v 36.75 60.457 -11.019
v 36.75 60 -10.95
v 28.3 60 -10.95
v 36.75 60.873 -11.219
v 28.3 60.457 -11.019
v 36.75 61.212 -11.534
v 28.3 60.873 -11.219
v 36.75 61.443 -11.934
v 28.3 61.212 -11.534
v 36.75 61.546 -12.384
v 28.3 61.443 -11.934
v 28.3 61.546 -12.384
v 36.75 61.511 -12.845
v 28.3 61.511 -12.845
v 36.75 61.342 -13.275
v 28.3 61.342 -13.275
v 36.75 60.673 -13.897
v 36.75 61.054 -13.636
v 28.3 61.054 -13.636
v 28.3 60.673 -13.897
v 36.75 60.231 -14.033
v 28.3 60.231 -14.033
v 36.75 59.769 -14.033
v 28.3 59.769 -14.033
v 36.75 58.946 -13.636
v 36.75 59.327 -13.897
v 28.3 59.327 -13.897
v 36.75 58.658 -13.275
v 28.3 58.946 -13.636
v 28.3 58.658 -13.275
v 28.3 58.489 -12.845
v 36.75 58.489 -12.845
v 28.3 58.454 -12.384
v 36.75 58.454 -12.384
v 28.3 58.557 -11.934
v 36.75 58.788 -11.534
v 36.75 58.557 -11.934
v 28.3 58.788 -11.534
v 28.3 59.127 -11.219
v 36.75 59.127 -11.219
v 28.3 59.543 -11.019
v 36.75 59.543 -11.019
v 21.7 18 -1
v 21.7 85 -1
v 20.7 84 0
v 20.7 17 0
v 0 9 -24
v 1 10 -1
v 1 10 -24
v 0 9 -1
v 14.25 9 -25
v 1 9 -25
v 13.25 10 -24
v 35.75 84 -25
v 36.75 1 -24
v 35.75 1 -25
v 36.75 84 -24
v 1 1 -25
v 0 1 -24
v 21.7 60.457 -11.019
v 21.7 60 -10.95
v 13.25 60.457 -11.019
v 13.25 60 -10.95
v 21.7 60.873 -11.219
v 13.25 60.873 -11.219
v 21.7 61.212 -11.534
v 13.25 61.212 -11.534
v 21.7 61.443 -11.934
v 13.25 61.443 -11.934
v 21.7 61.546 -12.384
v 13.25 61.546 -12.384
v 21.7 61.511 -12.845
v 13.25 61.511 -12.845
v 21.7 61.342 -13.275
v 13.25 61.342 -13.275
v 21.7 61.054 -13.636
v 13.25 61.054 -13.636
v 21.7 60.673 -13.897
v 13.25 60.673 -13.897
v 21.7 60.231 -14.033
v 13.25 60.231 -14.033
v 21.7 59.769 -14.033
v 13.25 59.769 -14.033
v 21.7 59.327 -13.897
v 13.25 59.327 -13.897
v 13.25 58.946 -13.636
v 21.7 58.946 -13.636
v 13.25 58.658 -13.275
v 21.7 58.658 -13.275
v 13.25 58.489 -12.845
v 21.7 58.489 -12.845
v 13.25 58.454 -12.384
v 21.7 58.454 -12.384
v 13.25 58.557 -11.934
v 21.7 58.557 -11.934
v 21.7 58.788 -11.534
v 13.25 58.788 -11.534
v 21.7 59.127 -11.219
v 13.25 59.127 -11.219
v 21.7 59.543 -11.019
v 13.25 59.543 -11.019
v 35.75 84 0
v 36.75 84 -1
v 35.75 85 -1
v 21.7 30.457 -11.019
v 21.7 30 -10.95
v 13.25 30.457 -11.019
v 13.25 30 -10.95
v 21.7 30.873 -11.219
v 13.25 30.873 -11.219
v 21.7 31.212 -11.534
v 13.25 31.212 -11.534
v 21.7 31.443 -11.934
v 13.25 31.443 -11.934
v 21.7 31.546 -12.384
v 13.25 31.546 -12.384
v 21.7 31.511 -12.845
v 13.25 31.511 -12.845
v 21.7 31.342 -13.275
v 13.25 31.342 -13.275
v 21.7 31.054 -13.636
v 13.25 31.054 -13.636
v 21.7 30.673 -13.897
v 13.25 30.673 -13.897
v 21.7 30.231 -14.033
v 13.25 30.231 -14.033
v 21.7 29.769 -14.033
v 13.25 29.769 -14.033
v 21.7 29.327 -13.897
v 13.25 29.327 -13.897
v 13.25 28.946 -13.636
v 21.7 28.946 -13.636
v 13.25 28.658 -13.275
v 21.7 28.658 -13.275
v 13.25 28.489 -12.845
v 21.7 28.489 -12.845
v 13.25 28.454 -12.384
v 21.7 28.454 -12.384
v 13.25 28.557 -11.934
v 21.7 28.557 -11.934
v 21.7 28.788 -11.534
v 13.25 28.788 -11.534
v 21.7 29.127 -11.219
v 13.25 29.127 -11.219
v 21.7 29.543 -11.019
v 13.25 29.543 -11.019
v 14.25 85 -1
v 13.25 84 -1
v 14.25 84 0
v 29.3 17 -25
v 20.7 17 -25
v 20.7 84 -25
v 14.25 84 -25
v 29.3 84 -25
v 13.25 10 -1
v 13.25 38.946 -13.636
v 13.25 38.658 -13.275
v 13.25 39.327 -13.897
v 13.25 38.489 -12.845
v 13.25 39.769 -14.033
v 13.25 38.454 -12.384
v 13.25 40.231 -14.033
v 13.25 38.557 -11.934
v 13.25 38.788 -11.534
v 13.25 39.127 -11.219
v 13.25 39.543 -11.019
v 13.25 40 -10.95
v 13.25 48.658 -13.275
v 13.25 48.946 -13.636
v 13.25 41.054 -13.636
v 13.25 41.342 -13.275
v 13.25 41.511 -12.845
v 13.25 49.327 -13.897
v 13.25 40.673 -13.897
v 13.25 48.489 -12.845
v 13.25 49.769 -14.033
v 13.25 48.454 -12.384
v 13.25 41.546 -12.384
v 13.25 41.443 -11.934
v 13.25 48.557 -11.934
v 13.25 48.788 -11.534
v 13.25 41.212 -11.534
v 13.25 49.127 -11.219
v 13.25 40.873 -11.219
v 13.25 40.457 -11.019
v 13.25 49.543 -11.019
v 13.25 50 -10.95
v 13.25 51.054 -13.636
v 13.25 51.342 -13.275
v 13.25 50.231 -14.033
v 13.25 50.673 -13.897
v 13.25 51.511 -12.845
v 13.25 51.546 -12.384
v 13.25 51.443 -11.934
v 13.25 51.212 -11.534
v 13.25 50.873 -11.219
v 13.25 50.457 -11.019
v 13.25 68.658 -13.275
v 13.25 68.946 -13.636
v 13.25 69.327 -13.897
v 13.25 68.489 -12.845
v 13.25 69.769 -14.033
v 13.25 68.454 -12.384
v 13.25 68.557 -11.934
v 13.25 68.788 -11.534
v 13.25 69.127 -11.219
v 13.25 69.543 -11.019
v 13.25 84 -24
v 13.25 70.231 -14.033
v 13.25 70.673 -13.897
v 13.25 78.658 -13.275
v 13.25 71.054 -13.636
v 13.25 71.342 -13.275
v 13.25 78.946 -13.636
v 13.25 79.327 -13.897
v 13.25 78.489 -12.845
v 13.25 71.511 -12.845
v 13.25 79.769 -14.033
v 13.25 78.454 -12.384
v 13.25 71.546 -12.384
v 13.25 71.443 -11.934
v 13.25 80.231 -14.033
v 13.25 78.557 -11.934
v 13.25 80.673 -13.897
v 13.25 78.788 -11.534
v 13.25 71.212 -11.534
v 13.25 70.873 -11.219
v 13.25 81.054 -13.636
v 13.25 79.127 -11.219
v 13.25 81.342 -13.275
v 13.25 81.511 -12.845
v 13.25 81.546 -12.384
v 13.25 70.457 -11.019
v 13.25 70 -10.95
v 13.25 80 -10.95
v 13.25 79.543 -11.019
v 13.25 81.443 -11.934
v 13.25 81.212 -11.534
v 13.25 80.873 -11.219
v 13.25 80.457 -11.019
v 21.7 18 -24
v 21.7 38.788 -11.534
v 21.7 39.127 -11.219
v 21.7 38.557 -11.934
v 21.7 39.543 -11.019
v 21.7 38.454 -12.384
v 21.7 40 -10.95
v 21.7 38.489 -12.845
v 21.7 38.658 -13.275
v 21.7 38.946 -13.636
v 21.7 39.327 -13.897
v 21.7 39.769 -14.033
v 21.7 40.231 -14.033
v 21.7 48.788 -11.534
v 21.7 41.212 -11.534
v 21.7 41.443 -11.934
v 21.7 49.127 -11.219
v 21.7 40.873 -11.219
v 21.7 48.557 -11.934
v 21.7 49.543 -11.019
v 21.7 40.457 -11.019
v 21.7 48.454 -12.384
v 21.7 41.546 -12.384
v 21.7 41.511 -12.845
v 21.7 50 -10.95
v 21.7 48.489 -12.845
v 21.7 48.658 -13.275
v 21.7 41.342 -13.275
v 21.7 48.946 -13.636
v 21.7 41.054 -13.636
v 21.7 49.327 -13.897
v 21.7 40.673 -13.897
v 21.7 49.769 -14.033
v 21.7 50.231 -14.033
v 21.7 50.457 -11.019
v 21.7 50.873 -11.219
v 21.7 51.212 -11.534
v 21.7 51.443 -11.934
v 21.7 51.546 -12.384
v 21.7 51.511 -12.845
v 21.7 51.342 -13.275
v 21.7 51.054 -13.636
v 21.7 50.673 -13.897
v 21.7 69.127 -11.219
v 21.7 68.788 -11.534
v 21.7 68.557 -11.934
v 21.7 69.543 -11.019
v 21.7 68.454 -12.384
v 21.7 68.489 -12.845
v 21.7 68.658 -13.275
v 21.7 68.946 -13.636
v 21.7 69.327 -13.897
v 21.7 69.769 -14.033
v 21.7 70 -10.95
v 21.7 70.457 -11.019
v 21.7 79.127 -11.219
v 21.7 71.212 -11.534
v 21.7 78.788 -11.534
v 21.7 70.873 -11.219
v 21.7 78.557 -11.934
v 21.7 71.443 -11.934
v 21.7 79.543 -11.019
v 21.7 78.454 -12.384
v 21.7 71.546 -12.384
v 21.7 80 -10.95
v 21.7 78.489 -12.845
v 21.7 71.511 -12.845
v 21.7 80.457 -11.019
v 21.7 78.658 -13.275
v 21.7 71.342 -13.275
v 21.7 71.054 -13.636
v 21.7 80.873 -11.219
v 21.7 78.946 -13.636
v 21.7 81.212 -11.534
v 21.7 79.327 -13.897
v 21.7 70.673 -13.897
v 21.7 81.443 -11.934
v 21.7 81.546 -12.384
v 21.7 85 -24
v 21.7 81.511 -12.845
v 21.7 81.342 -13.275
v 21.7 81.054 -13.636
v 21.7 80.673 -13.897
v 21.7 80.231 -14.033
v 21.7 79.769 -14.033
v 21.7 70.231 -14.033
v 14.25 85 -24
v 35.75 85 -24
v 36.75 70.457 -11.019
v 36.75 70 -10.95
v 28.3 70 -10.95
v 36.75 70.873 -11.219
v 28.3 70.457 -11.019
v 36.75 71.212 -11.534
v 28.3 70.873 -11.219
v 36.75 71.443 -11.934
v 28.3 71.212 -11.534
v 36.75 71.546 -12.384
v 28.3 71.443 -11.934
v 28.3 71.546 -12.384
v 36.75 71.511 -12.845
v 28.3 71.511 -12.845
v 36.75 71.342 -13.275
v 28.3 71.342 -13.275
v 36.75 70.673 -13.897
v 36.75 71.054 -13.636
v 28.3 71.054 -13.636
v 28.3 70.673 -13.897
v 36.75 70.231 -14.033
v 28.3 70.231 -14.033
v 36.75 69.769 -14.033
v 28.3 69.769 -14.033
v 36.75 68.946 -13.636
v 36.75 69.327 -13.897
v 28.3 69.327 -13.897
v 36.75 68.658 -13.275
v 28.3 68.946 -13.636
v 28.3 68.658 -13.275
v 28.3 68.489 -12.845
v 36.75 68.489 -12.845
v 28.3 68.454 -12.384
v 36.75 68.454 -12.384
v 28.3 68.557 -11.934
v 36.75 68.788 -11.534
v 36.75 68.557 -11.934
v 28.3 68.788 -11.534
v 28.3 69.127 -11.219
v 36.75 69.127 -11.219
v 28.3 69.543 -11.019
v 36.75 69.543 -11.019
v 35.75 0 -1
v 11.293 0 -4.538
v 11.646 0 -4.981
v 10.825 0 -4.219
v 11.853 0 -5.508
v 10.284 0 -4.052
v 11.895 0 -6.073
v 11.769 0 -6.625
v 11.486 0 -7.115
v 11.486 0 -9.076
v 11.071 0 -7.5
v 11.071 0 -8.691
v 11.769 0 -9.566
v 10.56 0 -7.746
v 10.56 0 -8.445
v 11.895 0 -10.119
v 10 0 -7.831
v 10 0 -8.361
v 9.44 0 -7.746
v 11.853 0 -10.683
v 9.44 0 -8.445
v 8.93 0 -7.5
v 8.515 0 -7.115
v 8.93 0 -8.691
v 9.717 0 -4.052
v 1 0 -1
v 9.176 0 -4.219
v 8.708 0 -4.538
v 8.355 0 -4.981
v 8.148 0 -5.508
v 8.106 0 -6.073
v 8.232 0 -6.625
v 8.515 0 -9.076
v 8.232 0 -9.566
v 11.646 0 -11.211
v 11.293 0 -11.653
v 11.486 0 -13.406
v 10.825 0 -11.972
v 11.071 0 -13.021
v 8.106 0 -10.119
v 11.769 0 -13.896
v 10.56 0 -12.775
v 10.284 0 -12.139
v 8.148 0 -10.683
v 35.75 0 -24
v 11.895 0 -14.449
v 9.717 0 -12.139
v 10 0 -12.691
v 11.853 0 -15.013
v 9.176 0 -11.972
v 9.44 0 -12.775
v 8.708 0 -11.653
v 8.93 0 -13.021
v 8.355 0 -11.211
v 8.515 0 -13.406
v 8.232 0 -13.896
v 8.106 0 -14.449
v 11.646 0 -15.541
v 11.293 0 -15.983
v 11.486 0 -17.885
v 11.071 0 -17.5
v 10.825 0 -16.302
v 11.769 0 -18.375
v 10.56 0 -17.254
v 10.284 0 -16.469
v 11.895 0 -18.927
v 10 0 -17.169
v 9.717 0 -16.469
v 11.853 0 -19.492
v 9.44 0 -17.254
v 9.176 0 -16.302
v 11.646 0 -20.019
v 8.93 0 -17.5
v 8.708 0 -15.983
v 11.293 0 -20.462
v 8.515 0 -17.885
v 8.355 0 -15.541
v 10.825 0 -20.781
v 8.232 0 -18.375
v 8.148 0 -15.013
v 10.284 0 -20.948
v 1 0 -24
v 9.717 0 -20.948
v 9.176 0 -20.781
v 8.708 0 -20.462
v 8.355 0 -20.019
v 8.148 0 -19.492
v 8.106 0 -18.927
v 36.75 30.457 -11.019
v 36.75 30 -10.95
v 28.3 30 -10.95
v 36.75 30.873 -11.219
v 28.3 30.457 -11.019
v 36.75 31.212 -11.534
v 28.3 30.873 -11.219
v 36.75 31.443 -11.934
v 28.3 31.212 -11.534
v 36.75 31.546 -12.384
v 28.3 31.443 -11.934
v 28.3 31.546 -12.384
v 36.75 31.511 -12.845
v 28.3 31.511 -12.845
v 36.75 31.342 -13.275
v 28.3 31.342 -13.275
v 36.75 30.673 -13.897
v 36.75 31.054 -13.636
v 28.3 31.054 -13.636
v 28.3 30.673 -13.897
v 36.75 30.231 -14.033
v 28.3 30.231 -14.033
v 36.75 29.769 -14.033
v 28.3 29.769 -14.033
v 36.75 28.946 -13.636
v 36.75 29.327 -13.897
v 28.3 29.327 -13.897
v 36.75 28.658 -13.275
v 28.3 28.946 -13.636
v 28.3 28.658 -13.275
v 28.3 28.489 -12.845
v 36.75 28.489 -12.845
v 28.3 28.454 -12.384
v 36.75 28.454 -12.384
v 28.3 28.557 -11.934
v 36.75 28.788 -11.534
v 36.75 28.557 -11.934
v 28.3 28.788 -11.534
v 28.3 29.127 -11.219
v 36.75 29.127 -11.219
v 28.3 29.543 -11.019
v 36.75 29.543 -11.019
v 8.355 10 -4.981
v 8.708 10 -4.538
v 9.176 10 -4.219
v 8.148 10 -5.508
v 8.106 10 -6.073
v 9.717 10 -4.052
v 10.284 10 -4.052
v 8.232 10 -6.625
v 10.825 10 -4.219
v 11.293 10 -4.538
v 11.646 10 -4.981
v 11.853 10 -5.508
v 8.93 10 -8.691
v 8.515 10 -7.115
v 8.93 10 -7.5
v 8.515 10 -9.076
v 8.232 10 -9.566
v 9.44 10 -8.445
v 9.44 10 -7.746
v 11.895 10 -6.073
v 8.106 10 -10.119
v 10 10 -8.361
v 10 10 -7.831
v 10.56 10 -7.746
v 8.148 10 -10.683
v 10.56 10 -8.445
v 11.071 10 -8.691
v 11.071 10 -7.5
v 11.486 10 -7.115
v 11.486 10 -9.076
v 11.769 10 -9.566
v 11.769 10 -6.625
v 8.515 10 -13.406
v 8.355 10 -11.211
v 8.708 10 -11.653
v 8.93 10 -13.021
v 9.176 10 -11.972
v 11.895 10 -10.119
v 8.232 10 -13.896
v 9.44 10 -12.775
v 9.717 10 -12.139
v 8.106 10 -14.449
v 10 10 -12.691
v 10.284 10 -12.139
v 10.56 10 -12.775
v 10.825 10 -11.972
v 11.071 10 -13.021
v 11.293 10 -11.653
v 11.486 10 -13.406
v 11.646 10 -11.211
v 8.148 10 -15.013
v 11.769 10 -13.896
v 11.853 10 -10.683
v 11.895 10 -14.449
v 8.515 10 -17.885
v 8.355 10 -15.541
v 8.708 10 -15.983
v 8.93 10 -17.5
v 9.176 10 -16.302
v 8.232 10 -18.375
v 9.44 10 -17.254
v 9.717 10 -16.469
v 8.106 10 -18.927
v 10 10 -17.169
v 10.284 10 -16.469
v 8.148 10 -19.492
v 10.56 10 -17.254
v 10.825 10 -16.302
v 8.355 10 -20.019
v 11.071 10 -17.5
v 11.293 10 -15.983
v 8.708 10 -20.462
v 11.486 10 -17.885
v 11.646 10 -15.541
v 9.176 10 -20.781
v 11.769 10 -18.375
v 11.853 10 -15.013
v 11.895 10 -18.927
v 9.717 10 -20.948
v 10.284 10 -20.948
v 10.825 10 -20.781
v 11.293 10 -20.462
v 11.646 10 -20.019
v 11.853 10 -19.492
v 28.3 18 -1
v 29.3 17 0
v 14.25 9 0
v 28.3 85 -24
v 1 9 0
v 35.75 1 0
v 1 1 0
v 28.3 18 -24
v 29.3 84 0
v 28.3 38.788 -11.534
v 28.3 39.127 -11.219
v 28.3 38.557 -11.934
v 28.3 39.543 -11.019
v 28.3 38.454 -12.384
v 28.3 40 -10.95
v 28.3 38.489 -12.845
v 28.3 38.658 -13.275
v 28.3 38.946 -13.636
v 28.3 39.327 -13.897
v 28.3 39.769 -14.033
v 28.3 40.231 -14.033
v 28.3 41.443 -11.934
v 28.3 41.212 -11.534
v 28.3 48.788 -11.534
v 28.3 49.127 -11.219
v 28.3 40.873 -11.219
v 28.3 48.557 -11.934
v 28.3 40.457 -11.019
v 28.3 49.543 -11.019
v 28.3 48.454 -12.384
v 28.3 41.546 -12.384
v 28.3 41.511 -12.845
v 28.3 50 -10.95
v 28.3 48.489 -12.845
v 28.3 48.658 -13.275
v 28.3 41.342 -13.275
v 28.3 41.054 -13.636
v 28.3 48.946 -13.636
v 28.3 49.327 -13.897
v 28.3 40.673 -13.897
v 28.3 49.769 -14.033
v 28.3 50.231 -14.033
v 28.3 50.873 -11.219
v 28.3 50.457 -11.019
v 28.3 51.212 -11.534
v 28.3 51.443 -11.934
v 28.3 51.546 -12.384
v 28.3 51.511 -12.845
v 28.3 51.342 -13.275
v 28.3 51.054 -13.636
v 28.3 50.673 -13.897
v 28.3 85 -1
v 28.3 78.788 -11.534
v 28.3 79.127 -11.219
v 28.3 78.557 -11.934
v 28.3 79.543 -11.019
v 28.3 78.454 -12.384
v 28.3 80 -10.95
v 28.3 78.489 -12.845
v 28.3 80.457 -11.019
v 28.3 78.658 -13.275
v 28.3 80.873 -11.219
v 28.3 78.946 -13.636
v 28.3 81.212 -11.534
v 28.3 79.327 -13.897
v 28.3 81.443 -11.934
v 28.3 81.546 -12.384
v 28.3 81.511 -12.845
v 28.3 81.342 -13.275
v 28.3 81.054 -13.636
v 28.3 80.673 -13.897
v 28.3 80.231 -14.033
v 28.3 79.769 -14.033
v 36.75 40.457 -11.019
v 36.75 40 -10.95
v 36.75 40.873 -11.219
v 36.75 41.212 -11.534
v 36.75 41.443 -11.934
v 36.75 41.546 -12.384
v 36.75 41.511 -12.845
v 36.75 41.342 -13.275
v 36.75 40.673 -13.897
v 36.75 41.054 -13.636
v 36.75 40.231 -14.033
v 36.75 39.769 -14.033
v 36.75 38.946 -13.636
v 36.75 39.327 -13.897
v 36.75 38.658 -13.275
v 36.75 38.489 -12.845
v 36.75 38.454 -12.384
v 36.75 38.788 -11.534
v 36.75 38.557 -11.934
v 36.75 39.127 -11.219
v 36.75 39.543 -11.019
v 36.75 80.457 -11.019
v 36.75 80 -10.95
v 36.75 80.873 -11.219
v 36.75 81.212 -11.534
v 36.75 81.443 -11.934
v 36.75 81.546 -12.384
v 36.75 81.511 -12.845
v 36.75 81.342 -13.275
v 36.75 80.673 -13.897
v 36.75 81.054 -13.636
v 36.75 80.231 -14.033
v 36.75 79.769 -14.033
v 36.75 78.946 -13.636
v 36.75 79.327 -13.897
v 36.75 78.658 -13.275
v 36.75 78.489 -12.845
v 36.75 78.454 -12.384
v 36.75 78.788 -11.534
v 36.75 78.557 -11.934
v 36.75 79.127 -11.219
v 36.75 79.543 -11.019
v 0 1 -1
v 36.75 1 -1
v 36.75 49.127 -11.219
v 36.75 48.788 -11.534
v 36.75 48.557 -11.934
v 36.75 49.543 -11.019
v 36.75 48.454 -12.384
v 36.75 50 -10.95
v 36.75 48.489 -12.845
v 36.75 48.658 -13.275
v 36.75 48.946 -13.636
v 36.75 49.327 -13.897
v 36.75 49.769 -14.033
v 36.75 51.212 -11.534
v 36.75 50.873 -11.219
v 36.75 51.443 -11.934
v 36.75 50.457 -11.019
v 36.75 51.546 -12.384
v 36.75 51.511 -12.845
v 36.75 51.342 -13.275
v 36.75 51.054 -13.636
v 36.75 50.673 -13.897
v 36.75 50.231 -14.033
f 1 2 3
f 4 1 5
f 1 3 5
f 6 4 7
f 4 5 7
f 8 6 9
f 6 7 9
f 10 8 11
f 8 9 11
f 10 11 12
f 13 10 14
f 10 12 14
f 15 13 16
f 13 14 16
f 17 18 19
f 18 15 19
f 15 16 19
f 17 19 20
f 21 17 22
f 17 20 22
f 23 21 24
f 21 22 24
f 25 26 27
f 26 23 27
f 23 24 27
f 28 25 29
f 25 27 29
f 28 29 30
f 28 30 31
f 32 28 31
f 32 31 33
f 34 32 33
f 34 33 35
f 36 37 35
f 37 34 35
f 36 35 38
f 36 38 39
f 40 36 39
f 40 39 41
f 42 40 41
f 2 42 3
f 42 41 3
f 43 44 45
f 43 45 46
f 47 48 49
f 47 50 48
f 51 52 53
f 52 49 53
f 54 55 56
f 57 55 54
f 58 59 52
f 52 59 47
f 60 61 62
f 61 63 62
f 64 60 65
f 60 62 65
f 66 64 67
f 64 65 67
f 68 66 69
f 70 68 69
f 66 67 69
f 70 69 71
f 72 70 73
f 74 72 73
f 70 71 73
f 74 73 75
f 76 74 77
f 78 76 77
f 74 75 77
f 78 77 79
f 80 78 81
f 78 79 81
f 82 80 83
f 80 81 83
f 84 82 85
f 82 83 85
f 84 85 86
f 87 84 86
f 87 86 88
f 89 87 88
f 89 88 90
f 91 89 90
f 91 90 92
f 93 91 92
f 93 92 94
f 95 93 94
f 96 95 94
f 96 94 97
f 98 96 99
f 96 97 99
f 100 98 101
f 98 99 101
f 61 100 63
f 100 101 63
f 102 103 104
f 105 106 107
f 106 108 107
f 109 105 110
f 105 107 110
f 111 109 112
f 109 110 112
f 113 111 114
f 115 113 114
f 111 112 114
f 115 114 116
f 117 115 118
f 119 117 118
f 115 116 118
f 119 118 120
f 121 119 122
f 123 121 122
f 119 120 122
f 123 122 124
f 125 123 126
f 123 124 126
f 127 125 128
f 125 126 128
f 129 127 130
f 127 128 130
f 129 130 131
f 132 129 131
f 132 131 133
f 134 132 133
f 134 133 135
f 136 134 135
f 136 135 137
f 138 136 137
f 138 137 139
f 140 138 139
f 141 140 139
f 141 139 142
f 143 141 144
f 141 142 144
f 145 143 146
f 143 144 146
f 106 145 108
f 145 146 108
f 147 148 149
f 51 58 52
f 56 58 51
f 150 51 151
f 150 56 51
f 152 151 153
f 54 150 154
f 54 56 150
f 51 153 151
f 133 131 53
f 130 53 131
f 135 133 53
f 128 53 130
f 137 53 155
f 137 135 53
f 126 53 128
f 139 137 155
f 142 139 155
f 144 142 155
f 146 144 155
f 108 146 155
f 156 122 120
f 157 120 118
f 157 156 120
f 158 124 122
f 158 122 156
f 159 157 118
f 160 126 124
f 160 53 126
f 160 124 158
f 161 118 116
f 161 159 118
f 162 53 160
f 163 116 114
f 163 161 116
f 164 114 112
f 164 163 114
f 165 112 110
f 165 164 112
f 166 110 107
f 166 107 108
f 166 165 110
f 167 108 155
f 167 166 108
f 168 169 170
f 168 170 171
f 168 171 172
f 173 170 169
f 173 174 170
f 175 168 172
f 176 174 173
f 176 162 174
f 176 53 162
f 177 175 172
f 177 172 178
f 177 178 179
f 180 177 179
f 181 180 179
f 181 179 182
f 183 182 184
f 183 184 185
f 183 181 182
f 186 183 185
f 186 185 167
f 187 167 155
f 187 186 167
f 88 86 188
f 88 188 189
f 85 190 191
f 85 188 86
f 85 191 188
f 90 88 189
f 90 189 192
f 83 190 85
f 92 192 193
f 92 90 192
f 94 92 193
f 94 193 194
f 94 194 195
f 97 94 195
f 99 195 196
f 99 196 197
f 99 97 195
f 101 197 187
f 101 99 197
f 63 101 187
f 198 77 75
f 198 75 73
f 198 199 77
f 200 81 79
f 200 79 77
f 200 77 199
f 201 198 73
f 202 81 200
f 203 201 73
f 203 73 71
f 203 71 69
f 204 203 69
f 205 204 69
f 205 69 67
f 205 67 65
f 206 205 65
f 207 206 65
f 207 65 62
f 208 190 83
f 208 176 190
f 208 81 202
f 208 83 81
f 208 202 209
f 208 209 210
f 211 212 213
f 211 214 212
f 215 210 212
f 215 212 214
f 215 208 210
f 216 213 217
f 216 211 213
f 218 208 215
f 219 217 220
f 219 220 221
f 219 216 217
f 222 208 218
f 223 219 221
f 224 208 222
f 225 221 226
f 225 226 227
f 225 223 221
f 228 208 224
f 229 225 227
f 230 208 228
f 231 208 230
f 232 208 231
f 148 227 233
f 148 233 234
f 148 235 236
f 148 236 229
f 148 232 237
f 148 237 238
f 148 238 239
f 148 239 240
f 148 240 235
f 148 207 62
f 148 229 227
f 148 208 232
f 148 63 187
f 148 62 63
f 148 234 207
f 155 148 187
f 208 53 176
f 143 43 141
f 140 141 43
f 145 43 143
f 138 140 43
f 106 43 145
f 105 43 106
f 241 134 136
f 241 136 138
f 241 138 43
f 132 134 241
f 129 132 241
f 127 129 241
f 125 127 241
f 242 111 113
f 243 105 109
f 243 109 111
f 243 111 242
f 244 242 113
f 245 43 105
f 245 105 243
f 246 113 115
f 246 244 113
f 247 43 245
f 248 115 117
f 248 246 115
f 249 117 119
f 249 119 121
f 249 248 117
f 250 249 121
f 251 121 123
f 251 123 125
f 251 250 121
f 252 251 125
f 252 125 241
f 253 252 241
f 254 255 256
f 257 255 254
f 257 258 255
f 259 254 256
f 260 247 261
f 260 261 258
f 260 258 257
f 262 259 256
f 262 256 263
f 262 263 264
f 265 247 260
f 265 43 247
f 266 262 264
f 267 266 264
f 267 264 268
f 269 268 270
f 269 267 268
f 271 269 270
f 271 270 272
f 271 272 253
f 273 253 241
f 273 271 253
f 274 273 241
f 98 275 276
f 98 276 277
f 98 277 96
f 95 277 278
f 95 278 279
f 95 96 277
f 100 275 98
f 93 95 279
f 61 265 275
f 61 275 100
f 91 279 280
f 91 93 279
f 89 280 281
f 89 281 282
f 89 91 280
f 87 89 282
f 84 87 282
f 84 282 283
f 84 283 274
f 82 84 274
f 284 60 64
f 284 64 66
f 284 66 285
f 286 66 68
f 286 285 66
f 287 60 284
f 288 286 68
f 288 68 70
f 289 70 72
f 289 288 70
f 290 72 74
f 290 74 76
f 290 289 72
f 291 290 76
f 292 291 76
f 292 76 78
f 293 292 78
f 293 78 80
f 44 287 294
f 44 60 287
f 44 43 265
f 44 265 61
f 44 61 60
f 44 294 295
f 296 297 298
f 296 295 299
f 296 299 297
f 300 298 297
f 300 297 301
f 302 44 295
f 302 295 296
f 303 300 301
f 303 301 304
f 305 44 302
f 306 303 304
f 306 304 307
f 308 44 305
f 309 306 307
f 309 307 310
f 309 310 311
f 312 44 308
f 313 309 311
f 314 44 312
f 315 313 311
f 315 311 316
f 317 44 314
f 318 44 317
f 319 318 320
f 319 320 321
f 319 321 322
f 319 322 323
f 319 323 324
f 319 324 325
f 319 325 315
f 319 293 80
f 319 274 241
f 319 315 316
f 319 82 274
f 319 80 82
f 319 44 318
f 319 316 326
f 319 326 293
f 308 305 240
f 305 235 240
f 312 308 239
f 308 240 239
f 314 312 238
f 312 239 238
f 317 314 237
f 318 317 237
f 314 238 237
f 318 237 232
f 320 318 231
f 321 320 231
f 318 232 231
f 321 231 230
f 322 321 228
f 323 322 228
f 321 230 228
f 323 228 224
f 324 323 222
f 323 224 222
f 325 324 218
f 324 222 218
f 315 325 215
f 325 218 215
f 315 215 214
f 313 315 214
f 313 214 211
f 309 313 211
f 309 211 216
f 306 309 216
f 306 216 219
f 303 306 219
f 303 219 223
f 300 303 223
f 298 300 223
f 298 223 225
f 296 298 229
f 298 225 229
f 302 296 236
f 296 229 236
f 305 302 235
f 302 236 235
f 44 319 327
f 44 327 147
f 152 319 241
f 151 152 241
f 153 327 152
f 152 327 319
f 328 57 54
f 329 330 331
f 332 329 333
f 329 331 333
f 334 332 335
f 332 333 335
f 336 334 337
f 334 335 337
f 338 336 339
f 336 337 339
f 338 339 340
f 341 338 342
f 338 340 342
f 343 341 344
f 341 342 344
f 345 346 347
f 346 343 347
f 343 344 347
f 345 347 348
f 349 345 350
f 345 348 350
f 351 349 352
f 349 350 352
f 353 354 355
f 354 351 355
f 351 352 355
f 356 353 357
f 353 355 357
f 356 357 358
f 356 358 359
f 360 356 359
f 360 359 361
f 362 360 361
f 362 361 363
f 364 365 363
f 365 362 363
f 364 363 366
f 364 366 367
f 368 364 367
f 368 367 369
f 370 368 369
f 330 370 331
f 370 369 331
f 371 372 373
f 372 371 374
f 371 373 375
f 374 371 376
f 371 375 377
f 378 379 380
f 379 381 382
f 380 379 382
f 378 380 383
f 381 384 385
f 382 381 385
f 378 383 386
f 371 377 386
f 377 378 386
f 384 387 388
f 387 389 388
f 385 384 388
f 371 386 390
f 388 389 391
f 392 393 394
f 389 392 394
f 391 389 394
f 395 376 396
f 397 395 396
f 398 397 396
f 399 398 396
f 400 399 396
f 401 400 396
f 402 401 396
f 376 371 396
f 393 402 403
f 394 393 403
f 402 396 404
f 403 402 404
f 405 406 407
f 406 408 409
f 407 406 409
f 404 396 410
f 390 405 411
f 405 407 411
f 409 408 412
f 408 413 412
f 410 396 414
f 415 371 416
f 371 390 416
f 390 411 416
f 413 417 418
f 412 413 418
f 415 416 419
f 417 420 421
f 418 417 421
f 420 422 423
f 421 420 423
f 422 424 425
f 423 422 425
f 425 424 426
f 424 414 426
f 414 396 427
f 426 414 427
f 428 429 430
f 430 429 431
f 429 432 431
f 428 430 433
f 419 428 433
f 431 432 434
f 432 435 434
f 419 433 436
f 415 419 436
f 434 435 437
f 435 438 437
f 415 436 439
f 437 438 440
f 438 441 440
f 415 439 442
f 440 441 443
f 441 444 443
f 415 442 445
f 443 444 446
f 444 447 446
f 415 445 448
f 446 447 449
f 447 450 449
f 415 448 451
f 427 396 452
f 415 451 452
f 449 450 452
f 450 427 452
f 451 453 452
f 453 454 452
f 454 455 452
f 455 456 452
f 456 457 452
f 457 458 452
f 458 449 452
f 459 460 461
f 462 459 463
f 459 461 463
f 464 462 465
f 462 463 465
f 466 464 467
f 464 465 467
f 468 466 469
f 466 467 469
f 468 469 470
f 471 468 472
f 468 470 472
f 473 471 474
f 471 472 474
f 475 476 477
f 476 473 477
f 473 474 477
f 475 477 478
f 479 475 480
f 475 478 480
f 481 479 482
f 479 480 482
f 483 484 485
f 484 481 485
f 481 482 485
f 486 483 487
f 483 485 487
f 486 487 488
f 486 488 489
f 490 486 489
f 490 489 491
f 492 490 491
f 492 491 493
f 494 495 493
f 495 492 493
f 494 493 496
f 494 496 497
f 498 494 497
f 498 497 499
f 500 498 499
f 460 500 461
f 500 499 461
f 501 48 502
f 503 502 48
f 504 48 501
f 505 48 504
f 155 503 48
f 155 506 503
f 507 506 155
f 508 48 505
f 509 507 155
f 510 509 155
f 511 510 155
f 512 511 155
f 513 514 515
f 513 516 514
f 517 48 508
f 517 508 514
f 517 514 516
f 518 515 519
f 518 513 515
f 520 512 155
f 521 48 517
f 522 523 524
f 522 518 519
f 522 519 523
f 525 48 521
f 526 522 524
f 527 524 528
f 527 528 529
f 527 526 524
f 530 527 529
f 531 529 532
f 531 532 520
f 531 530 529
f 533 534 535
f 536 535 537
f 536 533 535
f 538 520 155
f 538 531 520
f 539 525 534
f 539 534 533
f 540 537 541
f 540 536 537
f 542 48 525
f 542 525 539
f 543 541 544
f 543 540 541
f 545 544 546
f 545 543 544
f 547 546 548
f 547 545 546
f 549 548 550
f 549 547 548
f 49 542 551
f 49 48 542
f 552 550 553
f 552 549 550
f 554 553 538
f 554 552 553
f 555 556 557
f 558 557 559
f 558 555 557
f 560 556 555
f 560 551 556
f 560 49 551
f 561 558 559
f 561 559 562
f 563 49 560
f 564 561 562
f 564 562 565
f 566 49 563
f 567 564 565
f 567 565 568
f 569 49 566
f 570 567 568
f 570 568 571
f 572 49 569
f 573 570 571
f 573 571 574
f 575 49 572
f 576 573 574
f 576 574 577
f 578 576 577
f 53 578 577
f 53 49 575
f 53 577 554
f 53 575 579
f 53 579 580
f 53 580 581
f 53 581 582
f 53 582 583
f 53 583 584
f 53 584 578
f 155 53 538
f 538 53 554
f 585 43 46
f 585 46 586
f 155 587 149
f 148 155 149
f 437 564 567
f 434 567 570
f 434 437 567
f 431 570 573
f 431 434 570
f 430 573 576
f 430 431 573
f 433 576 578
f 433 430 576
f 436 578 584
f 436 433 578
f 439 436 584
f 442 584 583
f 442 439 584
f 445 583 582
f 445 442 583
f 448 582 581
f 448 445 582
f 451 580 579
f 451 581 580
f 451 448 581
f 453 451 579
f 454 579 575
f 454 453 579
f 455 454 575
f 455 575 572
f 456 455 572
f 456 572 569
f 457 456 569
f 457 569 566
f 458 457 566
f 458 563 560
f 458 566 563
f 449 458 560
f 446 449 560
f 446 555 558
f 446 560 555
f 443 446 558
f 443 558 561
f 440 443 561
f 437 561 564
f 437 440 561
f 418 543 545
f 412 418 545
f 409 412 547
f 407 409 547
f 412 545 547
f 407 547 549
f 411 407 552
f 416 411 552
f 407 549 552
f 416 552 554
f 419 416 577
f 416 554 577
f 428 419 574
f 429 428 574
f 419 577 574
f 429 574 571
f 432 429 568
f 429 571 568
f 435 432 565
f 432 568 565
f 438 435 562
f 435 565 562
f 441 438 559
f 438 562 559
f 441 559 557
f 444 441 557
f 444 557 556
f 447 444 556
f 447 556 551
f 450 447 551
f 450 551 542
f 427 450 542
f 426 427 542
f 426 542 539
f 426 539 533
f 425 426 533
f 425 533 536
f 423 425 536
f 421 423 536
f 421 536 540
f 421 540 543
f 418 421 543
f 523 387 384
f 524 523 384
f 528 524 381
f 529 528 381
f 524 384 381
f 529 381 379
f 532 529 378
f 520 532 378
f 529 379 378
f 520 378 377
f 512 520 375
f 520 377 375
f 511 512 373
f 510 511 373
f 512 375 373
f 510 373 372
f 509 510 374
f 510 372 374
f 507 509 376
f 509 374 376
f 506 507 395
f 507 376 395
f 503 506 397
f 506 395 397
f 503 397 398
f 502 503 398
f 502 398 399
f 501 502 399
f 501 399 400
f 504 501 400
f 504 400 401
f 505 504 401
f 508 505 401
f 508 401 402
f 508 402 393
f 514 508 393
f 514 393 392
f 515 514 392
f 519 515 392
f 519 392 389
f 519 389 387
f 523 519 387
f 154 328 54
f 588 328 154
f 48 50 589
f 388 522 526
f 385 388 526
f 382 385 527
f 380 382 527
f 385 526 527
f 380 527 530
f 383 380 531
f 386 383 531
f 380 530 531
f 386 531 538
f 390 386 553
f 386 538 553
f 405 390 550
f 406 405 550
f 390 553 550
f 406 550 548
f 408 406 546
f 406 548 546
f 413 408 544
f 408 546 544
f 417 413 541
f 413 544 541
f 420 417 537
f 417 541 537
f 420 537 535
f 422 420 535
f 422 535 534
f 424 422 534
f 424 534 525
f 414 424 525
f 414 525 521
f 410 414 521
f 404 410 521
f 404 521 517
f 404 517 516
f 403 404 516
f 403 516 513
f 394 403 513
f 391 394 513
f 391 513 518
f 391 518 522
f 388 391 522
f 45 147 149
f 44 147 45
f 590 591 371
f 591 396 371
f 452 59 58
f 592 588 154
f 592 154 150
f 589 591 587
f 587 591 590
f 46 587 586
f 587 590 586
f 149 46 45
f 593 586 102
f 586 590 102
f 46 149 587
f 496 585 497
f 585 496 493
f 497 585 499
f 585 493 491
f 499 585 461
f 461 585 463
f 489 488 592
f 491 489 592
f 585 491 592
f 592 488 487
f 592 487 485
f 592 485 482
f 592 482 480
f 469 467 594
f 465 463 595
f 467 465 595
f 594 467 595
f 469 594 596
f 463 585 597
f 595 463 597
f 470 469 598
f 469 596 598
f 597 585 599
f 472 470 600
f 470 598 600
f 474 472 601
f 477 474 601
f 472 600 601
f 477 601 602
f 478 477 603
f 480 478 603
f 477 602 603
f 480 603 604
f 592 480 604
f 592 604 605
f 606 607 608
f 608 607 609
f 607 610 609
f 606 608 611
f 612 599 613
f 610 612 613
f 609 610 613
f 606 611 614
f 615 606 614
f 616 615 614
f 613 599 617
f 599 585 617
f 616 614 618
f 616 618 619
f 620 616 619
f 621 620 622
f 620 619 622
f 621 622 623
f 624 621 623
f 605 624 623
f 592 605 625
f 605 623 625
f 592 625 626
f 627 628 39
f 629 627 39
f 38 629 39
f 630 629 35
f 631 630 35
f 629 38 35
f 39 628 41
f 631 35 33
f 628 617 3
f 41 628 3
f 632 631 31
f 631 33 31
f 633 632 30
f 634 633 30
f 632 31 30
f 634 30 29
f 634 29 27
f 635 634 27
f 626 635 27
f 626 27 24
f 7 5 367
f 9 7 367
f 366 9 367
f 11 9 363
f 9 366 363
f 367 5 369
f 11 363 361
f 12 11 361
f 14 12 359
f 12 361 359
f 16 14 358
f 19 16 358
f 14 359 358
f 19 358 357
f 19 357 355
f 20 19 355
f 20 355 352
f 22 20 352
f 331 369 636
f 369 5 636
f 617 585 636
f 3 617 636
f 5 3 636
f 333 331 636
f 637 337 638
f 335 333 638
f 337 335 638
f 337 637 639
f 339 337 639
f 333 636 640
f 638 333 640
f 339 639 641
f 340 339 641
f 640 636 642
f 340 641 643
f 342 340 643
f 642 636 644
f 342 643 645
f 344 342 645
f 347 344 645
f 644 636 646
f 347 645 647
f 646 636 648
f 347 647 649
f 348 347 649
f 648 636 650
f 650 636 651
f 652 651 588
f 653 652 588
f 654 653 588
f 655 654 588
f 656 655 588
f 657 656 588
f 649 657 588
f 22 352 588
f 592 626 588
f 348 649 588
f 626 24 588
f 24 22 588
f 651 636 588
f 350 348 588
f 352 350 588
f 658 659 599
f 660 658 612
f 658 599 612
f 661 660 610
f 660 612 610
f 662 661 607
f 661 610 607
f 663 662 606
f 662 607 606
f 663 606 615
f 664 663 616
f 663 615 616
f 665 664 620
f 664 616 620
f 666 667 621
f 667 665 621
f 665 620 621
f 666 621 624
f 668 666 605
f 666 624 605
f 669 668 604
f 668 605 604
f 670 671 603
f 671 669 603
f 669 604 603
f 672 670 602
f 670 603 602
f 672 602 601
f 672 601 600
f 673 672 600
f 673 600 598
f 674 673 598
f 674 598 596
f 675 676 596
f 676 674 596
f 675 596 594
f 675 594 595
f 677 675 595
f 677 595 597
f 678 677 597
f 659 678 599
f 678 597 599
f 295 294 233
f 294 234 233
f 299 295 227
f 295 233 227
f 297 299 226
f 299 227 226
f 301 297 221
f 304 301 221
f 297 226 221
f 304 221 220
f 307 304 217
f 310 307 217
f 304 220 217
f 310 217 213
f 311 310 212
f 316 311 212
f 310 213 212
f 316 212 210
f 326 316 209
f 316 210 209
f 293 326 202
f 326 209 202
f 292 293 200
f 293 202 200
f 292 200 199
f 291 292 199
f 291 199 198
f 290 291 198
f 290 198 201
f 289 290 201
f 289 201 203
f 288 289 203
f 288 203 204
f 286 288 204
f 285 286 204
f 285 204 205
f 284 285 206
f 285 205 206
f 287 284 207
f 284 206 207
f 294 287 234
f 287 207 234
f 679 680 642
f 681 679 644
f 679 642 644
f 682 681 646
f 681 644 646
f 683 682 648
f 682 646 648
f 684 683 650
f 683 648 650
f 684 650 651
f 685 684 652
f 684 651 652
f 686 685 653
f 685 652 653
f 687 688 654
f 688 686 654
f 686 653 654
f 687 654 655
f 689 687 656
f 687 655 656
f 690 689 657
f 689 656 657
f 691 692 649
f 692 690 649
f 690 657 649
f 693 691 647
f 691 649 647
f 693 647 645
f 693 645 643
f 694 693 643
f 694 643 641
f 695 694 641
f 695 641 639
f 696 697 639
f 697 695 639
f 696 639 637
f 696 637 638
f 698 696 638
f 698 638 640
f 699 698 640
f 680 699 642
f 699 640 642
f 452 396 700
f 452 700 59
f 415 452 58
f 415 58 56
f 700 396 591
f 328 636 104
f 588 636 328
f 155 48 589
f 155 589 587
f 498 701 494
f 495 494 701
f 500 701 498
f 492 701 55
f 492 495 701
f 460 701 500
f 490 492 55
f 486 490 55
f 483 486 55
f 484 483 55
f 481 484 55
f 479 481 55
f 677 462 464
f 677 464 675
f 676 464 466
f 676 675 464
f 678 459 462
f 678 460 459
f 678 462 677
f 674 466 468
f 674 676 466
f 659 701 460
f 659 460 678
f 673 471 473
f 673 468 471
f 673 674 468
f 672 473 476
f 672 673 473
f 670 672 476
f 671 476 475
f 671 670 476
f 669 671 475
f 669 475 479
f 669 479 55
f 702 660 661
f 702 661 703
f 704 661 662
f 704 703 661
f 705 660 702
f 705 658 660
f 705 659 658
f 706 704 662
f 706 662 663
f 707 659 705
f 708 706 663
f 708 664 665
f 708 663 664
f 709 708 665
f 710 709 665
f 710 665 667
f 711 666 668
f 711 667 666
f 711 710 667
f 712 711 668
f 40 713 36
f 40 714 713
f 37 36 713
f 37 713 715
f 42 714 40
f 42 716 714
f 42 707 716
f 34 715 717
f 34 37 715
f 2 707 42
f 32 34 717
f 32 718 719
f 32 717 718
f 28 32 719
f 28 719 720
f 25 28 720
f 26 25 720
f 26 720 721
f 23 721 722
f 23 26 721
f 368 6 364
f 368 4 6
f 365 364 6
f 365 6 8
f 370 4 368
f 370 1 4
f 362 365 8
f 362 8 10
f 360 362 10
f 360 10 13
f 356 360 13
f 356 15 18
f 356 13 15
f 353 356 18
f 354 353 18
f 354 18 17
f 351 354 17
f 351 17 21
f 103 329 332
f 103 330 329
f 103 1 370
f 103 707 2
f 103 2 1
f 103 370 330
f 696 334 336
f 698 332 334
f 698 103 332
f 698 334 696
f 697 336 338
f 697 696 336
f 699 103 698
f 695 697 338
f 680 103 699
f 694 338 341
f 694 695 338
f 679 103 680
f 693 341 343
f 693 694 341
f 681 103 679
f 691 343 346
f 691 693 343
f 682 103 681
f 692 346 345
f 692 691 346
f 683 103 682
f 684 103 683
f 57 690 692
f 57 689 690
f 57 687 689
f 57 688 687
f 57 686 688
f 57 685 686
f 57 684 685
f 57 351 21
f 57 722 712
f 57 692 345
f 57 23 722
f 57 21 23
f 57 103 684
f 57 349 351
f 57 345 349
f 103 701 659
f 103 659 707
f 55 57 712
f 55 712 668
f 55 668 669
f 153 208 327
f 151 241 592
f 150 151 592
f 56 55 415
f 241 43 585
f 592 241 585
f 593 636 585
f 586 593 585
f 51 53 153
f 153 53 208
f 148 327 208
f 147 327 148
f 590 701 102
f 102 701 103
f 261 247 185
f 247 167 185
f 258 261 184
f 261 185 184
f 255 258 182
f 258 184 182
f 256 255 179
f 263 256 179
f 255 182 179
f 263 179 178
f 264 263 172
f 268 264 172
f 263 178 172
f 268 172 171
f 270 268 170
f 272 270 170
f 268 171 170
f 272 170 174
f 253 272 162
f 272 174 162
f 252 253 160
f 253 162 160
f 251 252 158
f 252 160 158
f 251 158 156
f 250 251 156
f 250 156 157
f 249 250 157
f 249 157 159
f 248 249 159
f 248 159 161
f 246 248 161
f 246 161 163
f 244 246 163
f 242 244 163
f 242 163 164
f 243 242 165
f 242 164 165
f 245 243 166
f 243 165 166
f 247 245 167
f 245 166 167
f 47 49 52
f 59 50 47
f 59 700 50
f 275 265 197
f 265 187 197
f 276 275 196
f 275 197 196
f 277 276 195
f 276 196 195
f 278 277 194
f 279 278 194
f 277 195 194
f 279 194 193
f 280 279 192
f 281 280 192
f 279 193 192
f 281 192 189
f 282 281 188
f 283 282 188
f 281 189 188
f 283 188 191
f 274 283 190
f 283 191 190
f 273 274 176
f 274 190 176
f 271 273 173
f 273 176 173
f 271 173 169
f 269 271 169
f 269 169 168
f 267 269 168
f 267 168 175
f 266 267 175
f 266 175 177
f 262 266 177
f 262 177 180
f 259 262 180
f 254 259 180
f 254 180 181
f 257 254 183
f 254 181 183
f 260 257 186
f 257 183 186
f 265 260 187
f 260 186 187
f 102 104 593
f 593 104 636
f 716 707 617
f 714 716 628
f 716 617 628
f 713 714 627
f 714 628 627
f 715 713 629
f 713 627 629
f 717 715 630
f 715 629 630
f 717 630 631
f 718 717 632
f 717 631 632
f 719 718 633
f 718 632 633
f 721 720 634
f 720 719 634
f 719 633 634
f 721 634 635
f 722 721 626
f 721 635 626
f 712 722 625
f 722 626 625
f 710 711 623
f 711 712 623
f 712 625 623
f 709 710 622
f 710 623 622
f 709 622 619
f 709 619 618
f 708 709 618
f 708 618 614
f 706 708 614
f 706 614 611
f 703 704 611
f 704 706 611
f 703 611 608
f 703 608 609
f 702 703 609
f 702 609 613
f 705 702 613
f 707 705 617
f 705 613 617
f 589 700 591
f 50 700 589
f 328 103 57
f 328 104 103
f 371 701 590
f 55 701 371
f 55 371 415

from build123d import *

# Parameters (mm, degrees)
SKETCH1_W               = 50
SKETCH1_H               = 25
BOSS_EXTRUDE1_DEPTH     = 10
SKETCH2_W               = 20
SKETCH2_H               = 25
BOSS_EXTRUDE2_DEPTH     = 75
SKETCH3_W               = 6.6
SKETCH3_H               = 25
CUT_EXTRUDE1_DEPTH      = 75
SKETCH4_R               = 1.55
CUT_EXTRUDE2_DEPTH      = 96.262794416
LPATTERN1_COUNT         = 6
LPATTERN1_PITCH         = 10
SKETCH5_W               = 15
SKETCH5_H               = 25
CUT_EXTRUDE3_DEPTH      = 94.541434669
SKETCH6_R               = 1.9
CUT_EXTRUDE4_DEPTH      = 96.262794416
SKETCH7_R               = 1.9
CUT_EXTRUDE5_DEPTH      = 87.458082329
SKETCH8_W               = 6.6
SKETCH8_H               = 8
BOSS_EXTRUDE4_DEPTH     = 25
SKETCH11_W              = 25
SKETCH11_H              = 85
BOSS_EXTRUDE5_DEPTH     = 1.75
SKETCH12_W              = 25
SKETCH12_H              = 75
BOSS_EXTRUDE6_DEPTH     = 1.75
SKETCH14_R              = 1.9
CUT_EXTRUDE7_DEPTH      = 88.18120497
CUT_EXTRUDE8_DEPTH      = 94.010160735
CUT_EXTRUDE8_DEPTH_BACK = 94.010160735
SKETCH15_R              = 1.55
CHAMFER1_SIZE           = 1


with BuildPart() as part:
    # Sketch1 → Boss-Extrude1 (new body)
    with BuildSketch(Plane(origin=(0, 0, 0), x_dir=(1, 0, 0), z_dir=(0, 1, 0))):
        with Locations((25, 12.5)):
            Rectangle(SKETCH1_W, SKETCH1_H)
    extrude(amount=BOSS_EXTRUDE1_DEPTH)

    # Sketch2 → Boss-Extrude2 (add)
    with BuildSketch(Plane(origin=(0, 10, 0), x_dir=(1, 0, 0), z_dir=(0, 1, 0))):
        with Locations((25, 12.5)):
            Rectangle(SKETCH2_W, SKETCH2_H)
    extrude(amount=BOSS_EXTRUDE2_DEPTH)

    # Sketch3 → Cut-Extrude1 (cut)
    with BuildSketch(Plane(origin=(0, 85, 0), x_dir=(1, 0, 0), z_dir=(0, 1, 0))):
        with Locations((25, 12.5)):
            Rectangle(SKETCH3_W, SKETCH3_H)
    extrude(amount=-CUT_EXTRUDE1_DEPTH, mode=Mode.SUBTRACT)

    # Sketch4 → Cut-Extrude2 (cut, symmetric)
    with BuildSketch(Plane.ZY.offset(-15)):
        with Locations((-12.5, 80)):
            Circle(SKETCH4_R)
    cut_extrude2 = extrude(amount=CUT_EXTRUDE2_DEPTH, both=True, mode=Mode.SUBTRACT)

    # LPattern1: Cut-Extrude2 ×6
    with Locations(*[(0, -i * LPATTERN1_PITCH, 0) for i in range(1, LPATTERN1_COUNT)]):
        add(cut_extrude2, mode=Mode.SUBTRACT)

    # Sketch5 → Cut-Extrude3 (cut, through all)
    with BuildSketch(Plane(origin=(0, 10, 0), x_dir=(1, 0, 0), z_dir=(0, 1, 0))):
        with Locations((42.5, 12.5)):
            Rectangle(SKETCH5_W, SKETCH5_H)
    extrude(amount=-CUT_EXTRUDE3_DEPTH, mode=Mode.SUBTRACT)

    # Sketch6 → Cut-Extrude4 (cut, through all)
    with BuildSketch(Plane.XZ):
        with Locations(Location((10.000440006, -5.930630913, 0), (0, 0, 270))):
            Circle(SKETCH6_R)
    cut_extrude4 = extrude(amount=-CUT_EXTRUDE4_DEPTH, mode=Mode.SUBTRACT)

    # Mirror1: Cut-Extrude4 across plane
    add(cut_extrude4.mirror(Plane.XY.offset(-12.5)), mode=Mode.SUBTRACT)

    # Sketch7 → Cut-Extrude5 (cut, through all)
    with BuildSketch(Plane(origin=(0, 10, 0), x_dir=(1, 0, 0), z_dir=(0, 1, 0))):
        with Locations(Location((10.000440006, 14.590630913, 0), (0, 0, 270))):
            Circle(SKETCH7_R)
        with Locations(Location((10.000440006, 5.930630913, 0), (0, 0, 90))):
            Circle(SKETCH7_R)
    extrude(amount=-CUT_EXTRUDE5_DEPTH, mode=Mode.SUBTRACT)

    # Sketch8 → Boss-Extrude4 (add, through all)
    with BuildSketch(Plane.XY):
        with Locations((25, 14)):
            Rectangle(SKETCH8_W, SKETCH8_H)
    extrude(amount=-BOSS_EXTRUDE4_DEPTH)

    # Sketch11 → Boss-Extrude5 (add)
    with BuildSketch(Plane(origin=(35, 0, 0), x_dir=(0, 0, -1), z_dir=(1, 0, 0))):
        with Locations((12.5, 42.5)):
            Rectangle(SKETCH11_W, SKETCH11_H)
    extrude(amount=BOSS_EXTRUDE5_DEPTH)

    # Sketch12 → Boss-Extrude6 (add)
    with BuildSketch(Plane.ZY.offset(-15)):
        with Locations((-12.5, 47.5)):
            Rectangle(SKETCH12_W, SKETCH12_H)
    extrude(amount=BOSS_EXTRUDE6_DEPTH)

    # Sketch14 → Cut-Extrude7 (cut, through all)
    with BuildSketch(Plane(origin=(0, 10, 0), x_dir=(1, 0, 0), z_dir=(0, 1, 0))):
        with Locations(Location((10.000440006, 10.260630913, 0), (0, 0, 270))):
            Circle(SKETCH14_R)
    extrude(amount=-CUT_EXTRUDE7_DEPTH, mode=Mode.SUBTRACT)

    # Sketch15 → Cut-Extrude8 (cut, two sides: drawn at the far end of the back side and taken through both)
    with BuildSketch(Plane.ZY.offset(-28.3).offset(-CUT_EXTRUDE8_DEPTH_BACK)):
        with Locations((-12.5, 30)):
            Circle(SKETCH15_R)
        with Locations((-12.5, 40)):
            Circle(SKETCH15_R)
        with Locations((-12.5, 50)):
            Circle(SKETCH15_R)
        with Locations((-12.5, 60)):
            Circle(SKETCH15_R)
        with Locations((-12.5, 70)):
            Circle(SKETCH15_R)
        with Locations((-12.5, 80)):
            Circle(SKETCH15_R)
    extrude(amount=CUT_EXTRUDE8_DEPTH + CUT_EXTRUDE8_DEPTH_BACK, mode=Mode.SUBTRACT)

    # Chamfer1
    chamfer1_edges = [part.edges().sort_by_distance(p)[0] for p in [
        (21.7, 51.5, -25),
        (21.7, 51.5, 0),
        (28.3, 51.5, 0),
        (28.3, 51.5, -25),
        (25, 18, -25),
        (25, 18, 0),
        (36.75, 85, -12.5),
        (36.75, 42.5, 0),
        (36.75, 0, -12.5),
        (36.75, 42.5, -25),
        (6.625, 10, -25),
        (13.25, 47.5, -25),
        (13.25, 47.5, 0),
        (13.25, 85, -12.5),
        (17.475, 85, 0),
        (32.525, 85, -25),
        (32.525, 85, 0),
        (17.475, 85, -25),
        (0, 10, -12.5),
        (18.375, 0, 0),
        (0, 0, -12.5),
        (0, 5, -25),
        (18.375, 0, -25),
        (0, 5, 0),
        (6.625, 10, 0),
    ]]
    chamfer(chamfer1_edges, length=CHAMFER1_SIZE)


solid = part.part
